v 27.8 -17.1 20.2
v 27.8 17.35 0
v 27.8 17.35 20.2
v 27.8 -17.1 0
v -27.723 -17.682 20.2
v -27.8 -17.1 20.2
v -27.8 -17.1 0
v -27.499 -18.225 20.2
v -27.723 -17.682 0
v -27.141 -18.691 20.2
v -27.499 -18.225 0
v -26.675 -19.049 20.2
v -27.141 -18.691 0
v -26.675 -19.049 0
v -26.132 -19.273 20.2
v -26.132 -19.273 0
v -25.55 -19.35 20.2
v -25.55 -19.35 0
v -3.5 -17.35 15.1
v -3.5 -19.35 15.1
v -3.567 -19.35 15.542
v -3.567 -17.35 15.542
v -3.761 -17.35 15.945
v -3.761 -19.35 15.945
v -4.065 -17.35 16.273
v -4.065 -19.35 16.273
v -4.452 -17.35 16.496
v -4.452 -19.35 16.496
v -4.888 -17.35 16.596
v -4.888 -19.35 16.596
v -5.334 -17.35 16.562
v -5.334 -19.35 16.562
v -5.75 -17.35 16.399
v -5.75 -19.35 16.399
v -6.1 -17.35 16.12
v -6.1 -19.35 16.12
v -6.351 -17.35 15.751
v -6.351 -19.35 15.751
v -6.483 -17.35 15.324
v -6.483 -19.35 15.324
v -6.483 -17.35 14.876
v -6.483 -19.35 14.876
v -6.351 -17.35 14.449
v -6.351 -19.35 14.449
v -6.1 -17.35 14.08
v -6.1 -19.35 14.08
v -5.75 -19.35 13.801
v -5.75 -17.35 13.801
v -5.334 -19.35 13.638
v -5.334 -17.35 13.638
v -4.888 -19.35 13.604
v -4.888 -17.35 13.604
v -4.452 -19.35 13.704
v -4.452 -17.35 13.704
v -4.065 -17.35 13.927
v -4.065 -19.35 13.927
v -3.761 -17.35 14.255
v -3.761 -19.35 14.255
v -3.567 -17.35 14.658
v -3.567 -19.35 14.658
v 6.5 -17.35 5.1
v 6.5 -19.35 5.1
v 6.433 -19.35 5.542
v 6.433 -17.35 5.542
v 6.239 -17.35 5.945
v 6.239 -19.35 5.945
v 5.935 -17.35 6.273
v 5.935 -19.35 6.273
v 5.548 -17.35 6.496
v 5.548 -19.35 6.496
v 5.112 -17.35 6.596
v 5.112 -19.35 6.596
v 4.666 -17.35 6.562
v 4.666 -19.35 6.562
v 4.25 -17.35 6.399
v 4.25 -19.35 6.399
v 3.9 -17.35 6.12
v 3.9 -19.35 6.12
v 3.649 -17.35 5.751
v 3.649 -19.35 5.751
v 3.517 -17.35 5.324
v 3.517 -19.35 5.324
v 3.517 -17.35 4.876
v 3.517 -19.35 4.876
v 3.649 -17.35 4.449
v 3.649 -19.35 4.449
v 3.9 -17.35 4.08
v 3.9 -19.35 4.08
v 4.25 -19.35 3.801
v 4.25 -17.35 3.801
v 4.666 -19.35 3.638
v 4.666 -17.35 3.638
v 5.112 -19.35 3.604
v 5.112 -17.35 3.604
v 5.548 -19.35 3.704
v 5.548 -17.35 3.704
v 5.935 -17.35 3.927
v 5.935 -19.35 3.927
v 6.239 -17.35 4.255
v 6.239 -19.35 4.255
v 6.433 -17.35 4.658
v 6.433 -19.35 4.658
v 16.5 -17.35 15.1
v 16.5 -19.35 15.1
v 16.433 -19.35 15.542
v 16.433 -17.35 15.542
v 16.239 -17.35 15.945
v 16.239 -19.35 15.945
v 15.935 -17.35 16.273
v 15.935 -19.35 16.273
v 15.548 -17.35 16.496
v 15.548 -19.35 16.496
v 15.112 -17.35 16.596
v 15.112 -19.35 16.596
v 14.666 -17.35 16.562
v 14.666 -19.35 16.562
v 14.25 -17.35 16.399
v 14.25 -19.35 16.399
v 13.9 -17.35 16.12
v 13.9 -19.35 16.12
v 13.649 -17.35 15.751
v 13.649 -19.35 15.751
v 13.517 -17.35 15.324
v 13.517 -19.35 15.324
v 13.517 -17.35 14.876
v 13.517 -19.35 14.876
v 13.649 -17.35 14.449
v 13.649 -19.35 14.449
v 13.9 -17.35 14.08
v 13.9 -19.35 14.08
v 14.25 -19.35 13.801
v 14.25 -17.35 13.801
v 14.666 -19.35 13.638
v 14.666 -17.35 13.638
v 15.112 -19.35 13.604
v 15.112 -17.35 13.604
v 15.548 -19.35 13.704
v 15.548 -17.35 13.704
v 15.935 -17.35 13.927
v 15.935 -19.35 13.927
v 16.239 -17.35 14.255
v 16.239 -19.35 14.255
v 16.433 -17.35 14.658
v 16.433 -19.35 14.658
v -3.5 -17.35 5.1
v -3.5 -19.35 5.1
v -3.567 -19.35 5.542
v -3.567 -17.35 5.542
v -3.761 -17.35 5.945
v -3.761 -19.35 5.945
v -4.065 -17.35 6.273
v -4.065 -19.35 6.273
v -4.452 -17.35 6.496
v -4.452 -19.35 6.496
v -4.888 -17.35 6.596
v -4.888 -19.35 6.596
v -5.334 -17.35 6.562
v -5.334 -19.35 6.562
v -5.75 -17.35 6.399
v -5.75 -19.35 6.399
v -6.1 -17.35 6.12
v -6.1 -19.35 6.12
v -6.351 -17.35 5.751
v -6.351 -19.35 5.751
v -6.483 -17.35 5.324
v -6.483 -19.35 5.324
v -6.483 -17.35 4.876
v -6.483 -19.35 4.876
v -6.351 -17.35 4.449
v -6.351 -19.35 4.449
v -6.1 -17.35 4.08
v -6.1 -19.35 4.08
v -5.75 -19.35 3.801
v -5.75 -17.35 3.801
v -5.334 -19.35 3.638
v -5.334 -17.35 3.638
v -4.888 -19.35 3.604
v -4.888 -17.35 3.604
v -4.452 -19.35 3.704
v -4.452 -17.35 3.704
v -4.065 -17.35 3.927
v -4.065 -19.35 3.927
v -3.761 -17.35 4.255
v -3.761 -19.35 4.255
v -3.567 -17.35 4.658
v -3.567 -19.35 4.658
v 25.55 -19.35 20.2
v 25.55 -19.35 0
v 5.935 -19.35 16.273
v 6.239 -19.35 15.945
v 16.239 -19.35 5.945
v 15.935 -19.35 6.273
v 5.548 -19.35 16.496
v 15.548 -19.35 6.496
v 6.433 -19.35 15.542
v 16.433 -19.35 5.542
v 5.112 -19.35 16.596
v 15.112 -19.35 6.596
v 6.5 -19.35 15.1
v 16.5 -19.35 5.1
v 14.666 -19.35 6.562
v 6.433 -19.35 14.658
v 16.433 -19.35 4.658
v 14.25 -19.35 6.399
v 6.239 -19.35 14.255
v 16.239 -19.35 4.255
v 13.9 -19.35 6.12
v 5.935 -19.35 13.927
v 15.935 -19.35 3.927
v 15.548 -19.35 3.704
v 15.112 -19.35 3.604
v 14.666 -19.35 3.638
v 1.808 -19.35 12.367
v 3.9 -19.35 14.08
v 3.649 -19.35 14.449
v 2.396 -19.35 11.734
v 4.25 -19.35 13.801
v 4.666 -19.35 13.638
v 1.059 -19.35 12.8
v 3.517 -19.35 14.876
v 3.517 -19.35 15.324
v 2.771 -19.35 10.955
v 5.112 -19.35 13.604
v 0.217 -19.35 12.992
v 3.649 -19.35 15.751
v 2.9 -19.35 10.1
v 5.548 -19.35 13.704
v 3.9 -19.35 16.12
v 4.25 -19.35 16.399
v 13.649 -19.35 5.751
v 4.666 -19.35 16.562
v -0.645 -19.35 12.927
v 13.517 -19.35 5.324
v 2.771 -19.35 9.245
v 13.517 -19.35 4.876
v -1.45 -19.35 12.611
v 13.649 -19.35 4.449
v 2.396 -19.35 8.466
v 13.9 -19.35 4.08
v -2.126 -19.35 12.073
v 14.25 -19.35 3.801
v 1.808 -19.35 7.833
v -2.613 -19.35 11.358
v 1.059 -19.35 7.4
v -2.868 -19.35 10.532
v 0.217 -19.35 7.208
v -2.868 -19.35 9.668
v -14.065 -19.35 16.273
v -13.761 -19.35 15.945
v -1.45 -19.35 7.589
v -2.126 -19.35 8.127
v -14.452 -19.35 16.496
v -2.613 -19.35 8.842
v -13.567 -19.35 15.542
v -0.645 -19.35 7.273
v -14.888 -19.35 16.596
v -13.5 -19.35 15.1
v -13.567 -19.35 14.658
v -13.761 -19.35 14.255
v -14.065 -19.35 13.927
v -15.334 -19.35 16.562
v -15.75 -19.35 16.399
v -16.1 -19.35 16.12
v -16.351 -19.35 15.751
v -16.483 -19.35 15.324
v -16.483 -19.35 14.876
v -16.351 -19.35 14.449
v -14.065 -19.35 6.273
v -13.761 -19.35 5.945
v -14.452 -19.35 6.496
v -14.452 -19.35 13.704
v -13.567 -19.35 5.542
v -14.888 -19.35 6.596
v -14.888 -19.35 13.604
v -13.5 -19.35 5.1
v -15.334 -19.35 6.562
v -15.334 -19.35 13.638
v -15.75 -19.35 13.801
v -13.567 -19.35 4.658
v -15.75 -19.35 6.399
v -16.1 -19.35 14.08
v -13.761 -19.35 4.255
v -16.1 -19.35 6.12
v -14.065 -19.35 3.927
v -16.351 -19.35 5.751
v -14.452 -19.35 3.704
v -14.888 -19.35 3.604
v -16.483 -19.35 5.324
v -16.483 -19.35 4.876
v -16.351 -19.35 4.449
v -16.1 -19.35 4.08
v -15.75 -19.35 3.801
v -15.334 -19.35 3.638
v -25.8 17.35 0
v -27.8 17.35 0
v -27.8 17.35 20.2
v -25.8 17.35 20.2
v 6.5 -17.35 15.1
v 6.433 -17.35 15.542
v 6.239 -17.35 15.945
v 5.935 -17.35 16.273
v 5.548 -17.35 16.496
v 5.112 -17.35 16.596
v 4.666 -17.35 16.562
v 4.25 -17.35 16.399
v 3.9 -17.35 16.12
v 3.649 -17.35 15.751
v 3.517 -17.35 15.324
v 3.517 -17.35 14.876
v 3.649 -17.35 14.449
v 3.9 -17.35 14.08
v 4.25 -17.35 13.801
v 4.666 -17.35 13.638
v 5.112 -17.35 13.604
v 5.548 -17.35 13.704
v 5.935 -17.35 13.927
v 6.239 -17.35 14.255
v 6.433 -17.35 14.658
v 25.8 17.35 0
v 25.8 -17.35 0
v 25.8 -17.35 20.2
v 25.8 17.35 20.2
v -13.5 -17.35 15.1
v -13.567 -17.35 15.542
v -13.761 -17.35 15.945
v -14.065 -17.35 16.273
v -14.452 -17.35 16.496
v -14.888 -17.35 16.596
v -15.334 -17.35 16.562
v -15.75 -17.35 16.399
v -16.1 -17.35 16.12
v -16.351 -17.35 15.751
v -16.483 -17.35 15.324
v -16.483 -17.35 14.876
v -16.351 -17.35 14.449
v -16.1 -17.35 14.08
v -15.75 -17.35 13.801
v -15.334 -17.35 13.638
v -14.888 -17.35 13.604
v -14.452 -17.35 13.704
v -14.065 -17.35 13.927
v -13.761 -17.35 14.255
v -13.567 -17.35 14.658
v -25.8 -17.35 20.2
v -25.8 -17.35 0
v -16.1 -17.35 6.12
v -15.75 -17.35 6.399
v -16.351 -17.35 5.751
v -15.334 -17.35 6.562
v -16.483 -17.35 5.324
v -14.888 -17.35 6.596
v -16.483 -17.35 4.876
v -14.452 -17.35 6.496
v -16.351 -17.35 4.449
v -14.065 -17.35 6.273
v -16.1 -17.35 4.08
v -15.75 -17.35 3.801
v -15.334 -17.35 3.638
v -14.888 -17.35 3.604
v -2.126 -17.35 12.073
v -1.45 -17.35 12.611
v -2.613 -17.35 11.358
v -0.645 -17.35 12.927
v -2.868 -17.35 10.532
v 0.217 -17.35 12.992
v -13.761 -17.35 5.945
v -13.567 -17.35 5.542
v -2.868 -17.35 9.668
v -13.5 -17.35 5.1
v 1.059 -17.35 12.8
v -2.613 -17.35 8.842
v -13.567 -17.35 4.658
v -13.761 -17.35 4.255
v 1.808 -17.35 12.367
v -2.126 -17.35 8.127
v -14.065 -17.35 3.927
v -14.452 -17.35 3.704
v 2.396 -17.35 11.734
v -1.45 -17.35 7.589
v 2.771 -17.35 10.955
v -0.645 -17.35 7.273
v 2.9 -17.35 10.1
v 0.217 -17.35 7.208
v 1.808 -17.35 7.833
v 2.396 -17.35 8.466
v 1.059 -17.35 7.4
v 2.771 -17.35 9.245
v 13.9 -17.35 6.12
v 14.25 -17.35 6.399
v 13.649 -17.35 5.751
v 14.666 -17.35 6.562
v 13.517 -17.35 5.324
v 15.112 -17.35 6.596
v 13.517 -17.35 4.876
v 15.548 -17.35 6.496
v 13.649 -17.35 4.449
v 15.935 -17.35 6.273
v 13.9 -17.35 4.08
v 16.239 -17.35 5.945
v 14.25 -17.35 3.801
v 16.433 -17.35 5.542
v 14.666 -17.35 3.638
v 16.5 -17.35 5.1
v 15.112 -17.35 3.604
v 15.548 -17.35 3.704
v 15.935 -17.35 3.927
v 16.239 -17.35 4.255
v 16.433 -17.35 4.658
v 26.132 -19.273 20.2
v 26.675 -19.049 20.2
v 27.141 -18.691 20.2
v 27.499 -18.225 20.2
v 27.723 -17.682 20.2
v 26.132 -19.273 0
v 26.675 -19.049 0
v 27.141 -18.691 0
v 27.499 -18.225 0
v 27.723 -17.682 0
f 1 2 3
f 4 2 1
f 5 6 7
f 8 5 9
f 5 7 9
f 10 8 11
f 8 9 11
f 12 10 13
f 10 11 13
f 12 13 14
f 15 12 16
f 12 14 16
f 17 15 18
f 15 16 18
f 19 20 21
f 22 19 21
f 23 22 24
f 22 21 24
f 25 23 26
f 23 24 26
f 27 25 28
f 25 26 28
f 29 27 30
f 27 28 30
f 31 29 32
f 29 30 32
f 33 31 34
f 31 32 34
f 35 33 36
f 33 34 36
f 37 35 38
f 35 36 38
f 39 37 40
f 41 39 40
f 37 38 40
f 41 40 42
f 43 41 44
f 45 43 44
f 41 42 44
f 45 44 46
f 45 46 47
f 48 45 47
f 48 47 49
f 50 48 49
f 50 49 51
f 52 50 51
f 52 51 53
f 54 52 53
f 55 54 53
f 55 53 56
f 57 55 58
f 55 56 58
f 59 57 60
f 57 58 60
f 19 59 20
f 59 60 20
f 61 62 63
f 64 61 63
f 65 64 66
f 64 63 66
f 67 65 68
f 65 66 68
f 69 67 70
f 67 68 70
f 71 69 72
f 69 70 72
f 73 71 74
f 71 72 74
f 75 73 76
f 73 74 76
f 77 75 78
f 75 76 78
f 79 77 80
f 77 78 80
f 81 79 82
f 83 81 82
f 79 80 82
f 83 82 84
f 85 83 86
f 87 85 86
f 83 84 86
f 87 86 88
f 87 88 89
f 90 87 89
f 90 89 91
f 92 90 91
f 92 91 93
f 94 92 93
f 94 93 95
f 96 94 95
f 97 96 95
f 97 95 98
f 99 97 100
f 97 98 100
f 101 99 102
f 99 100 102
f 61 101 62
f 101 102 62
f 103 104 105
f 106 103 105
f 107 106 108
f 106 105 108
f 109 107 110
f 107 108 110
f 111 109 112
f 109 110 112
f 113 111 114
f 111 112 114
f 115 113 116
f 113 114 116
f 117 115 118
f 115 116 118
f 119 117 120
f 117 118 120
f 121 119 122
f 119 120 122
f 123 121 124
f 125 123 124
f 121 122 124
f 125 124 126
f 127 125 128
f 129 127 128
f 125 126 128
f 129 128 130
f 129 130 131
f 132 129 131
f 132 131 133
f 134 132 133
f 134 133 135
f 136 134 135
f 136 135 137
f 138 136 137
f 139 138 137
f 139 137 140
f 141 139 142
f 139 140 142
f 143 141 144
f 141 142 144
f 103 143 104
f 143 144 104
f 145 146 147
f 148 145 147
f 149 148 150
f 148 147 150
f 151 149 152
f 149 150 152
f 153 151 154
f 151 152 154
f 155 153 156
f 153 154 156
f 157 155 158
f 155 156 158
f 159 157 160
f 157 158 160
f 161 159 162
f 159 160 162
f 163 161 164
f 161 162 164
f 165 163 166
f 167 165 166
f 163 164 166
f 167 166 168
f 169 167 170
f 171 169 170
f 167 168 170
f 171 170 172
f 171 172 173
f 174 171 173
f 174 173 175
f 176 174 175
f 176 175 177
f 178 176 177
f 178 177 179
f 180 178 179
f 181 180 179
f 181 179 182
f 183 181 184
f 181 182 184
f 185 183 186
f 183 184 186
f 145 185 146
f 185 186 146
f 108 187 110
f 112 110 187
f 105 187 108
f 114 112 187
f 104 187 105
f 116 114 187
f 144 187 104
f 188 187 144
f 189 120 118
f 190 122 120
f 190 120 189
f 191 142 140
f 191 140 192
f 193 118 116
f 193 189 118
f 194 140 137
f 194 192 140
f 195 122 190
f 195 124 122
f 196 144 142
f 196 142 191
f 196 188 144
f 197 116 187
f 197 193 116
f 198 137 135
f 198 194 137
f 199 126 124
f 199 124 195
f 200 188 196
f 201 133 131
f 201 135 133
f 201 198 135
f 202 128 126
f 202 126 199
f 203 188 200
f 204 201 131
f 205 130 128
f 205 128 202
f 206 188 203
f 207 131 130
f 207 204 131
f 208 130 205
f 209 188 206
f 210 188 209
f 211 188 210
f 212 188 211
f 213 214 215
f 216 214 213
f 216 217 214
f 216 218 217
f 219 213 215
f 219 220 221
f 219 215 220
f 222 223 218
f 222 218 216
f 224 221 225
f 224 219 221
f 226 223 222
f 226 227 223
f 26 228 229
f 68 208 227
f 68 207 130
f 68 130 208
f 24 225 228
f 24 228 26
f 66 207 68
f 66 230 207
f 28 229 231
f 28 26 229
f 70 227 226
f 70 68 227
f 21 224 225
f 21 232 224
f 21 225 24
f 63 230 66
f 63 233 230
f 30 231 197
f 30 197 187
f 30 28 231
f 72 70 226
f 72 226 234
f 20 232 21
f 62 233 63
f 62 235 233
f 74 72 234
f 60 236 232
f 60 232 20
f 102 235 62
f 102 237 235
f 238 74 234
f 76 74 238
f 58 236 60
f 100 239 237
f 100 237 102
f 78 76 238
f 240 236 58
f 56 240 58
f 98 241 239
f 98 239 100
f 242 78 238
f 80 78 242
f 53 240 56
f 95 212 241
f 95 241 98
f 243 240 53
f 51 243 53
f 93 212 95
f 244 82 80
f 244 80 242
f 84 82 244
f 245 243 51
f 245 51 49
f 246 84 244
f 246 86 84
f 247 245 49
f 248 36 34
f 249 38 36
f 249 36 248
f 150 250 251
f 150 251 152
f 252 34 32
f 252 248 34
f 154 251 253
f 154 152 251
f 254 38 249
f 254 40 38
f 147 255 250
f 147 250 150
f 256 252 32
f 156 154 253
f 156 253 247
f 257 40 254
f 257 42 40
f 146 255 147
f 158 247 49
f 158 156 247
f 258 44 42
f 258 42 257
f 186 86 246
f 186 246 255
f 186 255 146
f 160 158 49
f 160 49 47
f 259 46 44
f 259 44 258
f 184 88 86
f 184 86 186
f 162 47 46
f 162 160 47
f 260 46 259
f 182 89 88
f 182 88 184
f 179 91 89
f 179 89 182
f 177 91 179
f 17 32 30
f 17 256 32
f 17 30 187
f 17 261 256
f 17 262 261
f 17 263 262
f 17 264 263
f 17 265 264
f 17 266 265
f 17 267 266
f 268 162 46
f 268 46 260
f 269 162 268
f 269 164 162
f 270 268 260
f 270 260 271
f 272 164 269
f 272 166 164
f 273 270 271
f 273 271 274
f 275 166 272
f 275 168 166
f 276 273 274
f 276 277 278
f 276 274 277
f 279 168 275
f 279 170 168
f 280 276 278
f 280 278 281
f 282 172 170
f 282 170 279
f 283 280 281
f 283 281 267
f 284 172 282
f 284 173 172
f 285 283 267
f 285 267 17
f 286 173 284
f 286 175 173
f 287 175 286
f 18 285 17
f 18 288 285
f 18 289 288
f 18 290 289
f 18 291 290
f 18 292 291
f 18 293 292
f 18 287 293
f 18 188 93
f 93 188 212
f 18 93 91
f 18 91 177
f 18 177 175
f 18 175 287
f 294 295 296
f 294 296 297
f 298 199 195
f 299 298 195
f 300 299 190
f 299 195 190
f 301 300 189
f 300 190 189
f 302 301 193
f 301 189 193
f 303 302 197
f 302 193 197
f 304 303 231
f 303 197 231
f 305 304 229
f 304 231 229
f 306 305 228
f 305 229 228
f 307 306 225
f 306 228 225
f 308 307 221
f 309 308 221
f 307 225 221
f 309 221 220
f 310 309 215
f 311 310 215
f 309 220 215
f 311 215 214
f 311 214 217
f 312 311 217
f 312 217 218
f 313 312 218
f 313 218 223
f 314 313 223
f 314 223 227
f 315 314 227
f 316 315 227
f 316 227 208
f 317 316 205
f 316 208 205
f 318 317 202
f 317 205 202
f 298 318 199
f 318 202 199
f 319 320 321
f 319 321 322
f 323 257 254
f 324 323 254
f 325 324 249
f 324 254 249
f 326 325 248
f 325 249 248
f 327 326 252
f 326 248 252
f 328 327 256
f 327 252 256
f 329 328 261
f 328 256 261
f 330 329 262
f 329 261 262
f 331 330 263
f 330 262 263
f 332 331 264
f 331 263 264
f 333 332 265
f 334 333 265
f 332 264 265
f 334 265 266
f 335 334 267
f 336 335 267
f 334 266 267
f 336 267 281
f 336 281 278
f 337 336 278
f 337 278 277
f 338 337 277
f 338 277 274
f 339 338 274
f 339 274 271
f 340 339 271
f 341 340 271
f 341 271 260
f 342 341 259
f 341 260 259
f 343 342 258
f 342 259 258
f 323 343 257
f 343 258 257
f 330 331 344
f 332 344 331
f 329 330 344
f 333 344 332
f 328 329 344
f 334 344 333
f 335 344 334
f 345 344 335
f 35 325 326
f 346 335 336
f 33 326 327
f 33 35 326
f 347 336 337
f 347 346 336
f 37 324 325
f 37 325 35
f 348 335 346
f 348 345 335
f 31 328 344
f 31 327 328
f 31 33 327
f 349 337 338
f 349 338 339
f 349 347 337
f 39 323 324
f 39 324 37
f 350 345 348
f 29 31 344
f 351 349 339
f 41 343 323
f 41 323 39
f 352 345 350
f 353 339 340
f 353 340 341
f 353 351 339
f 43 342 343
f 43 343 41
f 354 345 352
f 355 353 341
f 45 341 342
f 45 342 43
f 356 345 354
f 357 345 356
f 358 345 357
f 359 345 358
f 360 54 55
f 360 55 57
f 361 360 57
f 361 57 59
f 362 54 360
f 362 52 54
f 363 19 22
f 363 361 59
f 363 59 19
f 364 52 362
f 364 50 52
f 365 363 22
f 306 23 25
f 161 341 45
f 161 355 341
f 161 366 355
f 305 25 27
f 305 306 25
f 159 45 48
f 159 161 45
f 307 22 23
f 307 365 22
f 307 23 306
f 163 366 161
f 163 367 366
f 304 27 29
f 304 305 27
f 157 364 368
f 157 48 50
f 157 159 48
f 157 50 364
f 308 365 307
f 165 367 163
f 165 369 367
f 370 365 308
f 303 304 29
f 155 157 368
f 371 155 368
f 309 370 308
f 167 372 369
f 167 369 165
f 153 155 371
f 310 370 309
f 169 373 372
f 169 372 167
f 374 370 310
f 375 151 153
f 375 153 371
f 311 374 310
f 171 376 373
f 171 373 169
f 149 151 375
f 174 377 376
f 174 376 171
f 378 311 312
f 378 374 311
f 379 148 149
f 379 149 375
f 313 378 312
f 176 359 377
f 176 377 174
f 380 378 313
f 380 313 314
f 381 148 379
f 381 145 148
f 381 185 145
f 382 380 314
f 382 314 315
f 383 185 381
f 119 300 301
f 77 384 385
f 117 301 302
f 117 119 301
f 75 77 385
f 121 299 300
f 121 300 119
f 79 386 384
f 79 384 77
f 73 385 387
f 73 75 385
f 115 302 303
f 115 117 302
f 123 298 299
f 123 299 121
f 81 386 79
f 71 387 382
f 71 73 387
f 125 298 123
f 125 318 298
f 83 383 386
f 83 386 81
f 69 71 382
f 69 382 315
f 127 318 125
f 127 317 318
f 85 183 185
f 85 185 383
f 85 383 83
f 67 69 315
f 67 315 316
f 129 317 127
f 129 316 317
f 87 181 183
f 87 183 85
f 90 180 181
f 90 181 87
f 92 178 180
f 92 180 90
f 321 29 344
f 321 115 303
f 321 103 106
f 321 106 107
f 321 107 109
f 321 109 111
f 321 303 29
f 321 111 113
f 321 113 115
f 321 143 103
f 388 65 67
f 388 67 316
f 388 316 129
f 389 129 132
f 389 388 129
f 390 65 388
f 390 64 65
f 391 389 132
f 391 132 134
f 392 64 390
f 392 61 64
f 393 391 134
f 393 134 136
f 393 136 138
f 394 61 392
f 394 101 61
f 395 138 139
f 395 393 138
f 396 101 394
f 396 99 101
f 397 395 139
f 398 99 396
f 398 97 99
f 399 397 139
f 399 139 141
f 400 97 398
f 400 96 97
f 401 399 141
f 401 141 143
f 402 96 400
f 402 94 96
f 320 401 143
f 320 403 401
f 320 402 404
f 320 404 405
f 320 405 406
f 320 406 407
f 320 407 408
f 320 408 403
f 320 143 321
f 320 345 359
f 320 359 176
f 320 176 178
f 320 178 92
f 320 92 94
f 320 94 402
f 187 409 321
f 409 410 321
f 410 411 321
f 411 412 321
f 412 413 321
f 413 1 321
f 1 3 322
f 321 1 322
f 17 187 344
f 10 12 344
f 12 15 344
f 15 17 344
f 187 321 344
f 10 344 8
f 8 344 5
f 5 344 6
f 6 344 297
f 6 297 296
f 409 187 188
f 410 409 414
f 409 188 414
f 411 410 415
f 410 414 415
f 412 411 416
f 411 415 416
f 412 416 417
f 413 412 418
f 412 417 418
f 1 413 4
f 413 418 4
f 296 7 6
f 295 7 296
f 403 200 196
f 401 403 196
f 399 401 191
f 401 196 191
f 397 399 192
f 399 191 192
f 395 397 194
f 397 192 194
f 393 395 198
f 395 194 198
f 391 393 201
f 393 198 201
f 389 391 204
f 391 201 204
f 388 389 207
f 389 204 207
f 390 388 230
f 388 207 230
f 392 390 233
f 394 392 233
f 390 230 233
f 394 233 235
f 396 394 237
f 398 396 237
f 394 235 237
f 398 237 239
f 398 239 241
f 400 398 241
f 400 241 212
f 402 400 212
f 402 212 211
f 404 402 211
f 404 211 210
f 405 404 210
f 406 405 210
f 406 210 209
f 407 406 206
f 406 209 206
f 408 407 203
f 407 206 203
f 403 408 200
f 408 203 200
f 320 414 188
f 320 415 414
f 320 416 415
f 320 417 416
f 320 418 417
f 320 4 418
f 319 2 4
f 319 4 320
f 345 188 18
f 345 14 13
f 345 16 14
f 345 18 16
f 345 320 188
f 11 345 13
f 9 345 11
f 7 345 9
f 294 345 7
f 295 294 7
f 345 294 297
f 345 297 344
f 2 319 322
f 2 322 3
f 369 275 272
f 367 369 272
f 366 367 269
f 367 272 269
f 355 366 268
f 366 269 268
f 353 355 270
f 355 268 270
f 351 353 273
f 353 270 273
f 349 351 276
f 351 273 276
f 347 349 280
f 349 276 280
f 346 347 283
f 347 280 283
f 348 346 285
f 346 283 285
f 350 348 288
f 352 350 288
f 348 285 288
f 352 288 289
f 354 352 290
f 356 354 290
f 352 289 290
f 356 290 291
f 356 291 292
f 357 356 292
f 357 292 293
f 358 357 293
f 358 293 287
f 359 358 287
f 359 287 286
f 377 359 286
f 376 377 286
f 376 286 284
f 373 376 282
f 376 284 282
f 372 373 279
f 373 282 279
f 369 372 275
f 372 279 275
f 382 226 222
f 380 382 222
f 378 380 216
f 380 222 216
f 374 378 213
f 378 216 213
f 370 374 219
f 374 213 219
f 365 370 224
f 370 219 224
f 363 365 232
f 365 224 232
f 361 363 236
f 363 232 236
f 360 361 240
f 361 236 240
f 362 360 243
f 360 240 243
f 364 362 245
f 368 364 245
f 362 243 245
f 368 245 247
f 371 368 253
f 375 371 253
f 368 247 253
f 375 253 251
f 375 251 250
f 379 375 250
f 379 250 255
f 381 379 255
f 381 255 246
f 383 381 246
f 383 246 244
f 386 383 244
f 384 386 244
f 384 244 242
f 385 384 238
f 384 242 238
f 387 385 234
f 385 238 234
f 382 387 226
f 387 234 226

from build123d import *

# Parameters (mm, degrees)
PAD_DEPTH     = 20.2
SKETCH001_R   = 2.9
SKETCH001_R_2 = 1.5
POCKET_DEPTH  = 2


with BuildPart() as part:
    # Sketch → Pad (new body)
    with BuildSketch(Plane.XY):
        with BuildLine():
            Line((-27.8, 17.35), (-25.8, 17.35))
            Line((-25.8, 17.35), (-25.8, -17.35))
            Line((-25.8, -17.35), (25.8, -17.35))
            Line((25.8, -17.35), (25.8, 17.35))
            Line((25.8, 17.35), (27.8, 17.35))
            Line((27.8, 17.35), (27.8, -17.1))
            ThreePointArc((25.55, -19.35), (27.14099, -18.69099), (27.8, -17.1))
            Line((25.55, -19.35), (-25.55, -19.35))
            ThreePointArc((-27.8, -17.1), (-27.14099, -18.69099), (-25.55, -19.35))
            Line((-27.8, -17.1), (-27.8, 17.35))
        make_face()
    extrude(amount=PAD_DEPTH)

    # Sketch001 (on Face9 of Pad) → Pocket (cut)
    with BuildSketch(Plane.XZ.offset(19.35)):
        with Locations((0, 10.1)):
            Circle(SKETCH001_R)
        with Locations((5, 15.1)):
            Circle(SKETCH001_R_2)
        with Locations((-5, 15.1)):
            Circle(SKETCH001_R_2)
        with Locations((-5, 5.1)):
            Circle(SKETCH001_R_2)
        with Locations((5, 5.1)):
            Circle(SKETCH001_R_2)
        with Locations((-15, 15.1)):
            Circle(SKETCH001_R_2)
        with Locations((-15, 5.1)):
            Circle(SKETCH001_R_2)
        with Locations((15, 15.1)):
            Circle(SKETCH001_R_2)
        with Locations((15, 5.1)):
            Circle(SKETCH001_R_2)
    extrude(amount=-POCKET_DEPTH, mode=Mode.SUBTRACT)


solid = part.part
